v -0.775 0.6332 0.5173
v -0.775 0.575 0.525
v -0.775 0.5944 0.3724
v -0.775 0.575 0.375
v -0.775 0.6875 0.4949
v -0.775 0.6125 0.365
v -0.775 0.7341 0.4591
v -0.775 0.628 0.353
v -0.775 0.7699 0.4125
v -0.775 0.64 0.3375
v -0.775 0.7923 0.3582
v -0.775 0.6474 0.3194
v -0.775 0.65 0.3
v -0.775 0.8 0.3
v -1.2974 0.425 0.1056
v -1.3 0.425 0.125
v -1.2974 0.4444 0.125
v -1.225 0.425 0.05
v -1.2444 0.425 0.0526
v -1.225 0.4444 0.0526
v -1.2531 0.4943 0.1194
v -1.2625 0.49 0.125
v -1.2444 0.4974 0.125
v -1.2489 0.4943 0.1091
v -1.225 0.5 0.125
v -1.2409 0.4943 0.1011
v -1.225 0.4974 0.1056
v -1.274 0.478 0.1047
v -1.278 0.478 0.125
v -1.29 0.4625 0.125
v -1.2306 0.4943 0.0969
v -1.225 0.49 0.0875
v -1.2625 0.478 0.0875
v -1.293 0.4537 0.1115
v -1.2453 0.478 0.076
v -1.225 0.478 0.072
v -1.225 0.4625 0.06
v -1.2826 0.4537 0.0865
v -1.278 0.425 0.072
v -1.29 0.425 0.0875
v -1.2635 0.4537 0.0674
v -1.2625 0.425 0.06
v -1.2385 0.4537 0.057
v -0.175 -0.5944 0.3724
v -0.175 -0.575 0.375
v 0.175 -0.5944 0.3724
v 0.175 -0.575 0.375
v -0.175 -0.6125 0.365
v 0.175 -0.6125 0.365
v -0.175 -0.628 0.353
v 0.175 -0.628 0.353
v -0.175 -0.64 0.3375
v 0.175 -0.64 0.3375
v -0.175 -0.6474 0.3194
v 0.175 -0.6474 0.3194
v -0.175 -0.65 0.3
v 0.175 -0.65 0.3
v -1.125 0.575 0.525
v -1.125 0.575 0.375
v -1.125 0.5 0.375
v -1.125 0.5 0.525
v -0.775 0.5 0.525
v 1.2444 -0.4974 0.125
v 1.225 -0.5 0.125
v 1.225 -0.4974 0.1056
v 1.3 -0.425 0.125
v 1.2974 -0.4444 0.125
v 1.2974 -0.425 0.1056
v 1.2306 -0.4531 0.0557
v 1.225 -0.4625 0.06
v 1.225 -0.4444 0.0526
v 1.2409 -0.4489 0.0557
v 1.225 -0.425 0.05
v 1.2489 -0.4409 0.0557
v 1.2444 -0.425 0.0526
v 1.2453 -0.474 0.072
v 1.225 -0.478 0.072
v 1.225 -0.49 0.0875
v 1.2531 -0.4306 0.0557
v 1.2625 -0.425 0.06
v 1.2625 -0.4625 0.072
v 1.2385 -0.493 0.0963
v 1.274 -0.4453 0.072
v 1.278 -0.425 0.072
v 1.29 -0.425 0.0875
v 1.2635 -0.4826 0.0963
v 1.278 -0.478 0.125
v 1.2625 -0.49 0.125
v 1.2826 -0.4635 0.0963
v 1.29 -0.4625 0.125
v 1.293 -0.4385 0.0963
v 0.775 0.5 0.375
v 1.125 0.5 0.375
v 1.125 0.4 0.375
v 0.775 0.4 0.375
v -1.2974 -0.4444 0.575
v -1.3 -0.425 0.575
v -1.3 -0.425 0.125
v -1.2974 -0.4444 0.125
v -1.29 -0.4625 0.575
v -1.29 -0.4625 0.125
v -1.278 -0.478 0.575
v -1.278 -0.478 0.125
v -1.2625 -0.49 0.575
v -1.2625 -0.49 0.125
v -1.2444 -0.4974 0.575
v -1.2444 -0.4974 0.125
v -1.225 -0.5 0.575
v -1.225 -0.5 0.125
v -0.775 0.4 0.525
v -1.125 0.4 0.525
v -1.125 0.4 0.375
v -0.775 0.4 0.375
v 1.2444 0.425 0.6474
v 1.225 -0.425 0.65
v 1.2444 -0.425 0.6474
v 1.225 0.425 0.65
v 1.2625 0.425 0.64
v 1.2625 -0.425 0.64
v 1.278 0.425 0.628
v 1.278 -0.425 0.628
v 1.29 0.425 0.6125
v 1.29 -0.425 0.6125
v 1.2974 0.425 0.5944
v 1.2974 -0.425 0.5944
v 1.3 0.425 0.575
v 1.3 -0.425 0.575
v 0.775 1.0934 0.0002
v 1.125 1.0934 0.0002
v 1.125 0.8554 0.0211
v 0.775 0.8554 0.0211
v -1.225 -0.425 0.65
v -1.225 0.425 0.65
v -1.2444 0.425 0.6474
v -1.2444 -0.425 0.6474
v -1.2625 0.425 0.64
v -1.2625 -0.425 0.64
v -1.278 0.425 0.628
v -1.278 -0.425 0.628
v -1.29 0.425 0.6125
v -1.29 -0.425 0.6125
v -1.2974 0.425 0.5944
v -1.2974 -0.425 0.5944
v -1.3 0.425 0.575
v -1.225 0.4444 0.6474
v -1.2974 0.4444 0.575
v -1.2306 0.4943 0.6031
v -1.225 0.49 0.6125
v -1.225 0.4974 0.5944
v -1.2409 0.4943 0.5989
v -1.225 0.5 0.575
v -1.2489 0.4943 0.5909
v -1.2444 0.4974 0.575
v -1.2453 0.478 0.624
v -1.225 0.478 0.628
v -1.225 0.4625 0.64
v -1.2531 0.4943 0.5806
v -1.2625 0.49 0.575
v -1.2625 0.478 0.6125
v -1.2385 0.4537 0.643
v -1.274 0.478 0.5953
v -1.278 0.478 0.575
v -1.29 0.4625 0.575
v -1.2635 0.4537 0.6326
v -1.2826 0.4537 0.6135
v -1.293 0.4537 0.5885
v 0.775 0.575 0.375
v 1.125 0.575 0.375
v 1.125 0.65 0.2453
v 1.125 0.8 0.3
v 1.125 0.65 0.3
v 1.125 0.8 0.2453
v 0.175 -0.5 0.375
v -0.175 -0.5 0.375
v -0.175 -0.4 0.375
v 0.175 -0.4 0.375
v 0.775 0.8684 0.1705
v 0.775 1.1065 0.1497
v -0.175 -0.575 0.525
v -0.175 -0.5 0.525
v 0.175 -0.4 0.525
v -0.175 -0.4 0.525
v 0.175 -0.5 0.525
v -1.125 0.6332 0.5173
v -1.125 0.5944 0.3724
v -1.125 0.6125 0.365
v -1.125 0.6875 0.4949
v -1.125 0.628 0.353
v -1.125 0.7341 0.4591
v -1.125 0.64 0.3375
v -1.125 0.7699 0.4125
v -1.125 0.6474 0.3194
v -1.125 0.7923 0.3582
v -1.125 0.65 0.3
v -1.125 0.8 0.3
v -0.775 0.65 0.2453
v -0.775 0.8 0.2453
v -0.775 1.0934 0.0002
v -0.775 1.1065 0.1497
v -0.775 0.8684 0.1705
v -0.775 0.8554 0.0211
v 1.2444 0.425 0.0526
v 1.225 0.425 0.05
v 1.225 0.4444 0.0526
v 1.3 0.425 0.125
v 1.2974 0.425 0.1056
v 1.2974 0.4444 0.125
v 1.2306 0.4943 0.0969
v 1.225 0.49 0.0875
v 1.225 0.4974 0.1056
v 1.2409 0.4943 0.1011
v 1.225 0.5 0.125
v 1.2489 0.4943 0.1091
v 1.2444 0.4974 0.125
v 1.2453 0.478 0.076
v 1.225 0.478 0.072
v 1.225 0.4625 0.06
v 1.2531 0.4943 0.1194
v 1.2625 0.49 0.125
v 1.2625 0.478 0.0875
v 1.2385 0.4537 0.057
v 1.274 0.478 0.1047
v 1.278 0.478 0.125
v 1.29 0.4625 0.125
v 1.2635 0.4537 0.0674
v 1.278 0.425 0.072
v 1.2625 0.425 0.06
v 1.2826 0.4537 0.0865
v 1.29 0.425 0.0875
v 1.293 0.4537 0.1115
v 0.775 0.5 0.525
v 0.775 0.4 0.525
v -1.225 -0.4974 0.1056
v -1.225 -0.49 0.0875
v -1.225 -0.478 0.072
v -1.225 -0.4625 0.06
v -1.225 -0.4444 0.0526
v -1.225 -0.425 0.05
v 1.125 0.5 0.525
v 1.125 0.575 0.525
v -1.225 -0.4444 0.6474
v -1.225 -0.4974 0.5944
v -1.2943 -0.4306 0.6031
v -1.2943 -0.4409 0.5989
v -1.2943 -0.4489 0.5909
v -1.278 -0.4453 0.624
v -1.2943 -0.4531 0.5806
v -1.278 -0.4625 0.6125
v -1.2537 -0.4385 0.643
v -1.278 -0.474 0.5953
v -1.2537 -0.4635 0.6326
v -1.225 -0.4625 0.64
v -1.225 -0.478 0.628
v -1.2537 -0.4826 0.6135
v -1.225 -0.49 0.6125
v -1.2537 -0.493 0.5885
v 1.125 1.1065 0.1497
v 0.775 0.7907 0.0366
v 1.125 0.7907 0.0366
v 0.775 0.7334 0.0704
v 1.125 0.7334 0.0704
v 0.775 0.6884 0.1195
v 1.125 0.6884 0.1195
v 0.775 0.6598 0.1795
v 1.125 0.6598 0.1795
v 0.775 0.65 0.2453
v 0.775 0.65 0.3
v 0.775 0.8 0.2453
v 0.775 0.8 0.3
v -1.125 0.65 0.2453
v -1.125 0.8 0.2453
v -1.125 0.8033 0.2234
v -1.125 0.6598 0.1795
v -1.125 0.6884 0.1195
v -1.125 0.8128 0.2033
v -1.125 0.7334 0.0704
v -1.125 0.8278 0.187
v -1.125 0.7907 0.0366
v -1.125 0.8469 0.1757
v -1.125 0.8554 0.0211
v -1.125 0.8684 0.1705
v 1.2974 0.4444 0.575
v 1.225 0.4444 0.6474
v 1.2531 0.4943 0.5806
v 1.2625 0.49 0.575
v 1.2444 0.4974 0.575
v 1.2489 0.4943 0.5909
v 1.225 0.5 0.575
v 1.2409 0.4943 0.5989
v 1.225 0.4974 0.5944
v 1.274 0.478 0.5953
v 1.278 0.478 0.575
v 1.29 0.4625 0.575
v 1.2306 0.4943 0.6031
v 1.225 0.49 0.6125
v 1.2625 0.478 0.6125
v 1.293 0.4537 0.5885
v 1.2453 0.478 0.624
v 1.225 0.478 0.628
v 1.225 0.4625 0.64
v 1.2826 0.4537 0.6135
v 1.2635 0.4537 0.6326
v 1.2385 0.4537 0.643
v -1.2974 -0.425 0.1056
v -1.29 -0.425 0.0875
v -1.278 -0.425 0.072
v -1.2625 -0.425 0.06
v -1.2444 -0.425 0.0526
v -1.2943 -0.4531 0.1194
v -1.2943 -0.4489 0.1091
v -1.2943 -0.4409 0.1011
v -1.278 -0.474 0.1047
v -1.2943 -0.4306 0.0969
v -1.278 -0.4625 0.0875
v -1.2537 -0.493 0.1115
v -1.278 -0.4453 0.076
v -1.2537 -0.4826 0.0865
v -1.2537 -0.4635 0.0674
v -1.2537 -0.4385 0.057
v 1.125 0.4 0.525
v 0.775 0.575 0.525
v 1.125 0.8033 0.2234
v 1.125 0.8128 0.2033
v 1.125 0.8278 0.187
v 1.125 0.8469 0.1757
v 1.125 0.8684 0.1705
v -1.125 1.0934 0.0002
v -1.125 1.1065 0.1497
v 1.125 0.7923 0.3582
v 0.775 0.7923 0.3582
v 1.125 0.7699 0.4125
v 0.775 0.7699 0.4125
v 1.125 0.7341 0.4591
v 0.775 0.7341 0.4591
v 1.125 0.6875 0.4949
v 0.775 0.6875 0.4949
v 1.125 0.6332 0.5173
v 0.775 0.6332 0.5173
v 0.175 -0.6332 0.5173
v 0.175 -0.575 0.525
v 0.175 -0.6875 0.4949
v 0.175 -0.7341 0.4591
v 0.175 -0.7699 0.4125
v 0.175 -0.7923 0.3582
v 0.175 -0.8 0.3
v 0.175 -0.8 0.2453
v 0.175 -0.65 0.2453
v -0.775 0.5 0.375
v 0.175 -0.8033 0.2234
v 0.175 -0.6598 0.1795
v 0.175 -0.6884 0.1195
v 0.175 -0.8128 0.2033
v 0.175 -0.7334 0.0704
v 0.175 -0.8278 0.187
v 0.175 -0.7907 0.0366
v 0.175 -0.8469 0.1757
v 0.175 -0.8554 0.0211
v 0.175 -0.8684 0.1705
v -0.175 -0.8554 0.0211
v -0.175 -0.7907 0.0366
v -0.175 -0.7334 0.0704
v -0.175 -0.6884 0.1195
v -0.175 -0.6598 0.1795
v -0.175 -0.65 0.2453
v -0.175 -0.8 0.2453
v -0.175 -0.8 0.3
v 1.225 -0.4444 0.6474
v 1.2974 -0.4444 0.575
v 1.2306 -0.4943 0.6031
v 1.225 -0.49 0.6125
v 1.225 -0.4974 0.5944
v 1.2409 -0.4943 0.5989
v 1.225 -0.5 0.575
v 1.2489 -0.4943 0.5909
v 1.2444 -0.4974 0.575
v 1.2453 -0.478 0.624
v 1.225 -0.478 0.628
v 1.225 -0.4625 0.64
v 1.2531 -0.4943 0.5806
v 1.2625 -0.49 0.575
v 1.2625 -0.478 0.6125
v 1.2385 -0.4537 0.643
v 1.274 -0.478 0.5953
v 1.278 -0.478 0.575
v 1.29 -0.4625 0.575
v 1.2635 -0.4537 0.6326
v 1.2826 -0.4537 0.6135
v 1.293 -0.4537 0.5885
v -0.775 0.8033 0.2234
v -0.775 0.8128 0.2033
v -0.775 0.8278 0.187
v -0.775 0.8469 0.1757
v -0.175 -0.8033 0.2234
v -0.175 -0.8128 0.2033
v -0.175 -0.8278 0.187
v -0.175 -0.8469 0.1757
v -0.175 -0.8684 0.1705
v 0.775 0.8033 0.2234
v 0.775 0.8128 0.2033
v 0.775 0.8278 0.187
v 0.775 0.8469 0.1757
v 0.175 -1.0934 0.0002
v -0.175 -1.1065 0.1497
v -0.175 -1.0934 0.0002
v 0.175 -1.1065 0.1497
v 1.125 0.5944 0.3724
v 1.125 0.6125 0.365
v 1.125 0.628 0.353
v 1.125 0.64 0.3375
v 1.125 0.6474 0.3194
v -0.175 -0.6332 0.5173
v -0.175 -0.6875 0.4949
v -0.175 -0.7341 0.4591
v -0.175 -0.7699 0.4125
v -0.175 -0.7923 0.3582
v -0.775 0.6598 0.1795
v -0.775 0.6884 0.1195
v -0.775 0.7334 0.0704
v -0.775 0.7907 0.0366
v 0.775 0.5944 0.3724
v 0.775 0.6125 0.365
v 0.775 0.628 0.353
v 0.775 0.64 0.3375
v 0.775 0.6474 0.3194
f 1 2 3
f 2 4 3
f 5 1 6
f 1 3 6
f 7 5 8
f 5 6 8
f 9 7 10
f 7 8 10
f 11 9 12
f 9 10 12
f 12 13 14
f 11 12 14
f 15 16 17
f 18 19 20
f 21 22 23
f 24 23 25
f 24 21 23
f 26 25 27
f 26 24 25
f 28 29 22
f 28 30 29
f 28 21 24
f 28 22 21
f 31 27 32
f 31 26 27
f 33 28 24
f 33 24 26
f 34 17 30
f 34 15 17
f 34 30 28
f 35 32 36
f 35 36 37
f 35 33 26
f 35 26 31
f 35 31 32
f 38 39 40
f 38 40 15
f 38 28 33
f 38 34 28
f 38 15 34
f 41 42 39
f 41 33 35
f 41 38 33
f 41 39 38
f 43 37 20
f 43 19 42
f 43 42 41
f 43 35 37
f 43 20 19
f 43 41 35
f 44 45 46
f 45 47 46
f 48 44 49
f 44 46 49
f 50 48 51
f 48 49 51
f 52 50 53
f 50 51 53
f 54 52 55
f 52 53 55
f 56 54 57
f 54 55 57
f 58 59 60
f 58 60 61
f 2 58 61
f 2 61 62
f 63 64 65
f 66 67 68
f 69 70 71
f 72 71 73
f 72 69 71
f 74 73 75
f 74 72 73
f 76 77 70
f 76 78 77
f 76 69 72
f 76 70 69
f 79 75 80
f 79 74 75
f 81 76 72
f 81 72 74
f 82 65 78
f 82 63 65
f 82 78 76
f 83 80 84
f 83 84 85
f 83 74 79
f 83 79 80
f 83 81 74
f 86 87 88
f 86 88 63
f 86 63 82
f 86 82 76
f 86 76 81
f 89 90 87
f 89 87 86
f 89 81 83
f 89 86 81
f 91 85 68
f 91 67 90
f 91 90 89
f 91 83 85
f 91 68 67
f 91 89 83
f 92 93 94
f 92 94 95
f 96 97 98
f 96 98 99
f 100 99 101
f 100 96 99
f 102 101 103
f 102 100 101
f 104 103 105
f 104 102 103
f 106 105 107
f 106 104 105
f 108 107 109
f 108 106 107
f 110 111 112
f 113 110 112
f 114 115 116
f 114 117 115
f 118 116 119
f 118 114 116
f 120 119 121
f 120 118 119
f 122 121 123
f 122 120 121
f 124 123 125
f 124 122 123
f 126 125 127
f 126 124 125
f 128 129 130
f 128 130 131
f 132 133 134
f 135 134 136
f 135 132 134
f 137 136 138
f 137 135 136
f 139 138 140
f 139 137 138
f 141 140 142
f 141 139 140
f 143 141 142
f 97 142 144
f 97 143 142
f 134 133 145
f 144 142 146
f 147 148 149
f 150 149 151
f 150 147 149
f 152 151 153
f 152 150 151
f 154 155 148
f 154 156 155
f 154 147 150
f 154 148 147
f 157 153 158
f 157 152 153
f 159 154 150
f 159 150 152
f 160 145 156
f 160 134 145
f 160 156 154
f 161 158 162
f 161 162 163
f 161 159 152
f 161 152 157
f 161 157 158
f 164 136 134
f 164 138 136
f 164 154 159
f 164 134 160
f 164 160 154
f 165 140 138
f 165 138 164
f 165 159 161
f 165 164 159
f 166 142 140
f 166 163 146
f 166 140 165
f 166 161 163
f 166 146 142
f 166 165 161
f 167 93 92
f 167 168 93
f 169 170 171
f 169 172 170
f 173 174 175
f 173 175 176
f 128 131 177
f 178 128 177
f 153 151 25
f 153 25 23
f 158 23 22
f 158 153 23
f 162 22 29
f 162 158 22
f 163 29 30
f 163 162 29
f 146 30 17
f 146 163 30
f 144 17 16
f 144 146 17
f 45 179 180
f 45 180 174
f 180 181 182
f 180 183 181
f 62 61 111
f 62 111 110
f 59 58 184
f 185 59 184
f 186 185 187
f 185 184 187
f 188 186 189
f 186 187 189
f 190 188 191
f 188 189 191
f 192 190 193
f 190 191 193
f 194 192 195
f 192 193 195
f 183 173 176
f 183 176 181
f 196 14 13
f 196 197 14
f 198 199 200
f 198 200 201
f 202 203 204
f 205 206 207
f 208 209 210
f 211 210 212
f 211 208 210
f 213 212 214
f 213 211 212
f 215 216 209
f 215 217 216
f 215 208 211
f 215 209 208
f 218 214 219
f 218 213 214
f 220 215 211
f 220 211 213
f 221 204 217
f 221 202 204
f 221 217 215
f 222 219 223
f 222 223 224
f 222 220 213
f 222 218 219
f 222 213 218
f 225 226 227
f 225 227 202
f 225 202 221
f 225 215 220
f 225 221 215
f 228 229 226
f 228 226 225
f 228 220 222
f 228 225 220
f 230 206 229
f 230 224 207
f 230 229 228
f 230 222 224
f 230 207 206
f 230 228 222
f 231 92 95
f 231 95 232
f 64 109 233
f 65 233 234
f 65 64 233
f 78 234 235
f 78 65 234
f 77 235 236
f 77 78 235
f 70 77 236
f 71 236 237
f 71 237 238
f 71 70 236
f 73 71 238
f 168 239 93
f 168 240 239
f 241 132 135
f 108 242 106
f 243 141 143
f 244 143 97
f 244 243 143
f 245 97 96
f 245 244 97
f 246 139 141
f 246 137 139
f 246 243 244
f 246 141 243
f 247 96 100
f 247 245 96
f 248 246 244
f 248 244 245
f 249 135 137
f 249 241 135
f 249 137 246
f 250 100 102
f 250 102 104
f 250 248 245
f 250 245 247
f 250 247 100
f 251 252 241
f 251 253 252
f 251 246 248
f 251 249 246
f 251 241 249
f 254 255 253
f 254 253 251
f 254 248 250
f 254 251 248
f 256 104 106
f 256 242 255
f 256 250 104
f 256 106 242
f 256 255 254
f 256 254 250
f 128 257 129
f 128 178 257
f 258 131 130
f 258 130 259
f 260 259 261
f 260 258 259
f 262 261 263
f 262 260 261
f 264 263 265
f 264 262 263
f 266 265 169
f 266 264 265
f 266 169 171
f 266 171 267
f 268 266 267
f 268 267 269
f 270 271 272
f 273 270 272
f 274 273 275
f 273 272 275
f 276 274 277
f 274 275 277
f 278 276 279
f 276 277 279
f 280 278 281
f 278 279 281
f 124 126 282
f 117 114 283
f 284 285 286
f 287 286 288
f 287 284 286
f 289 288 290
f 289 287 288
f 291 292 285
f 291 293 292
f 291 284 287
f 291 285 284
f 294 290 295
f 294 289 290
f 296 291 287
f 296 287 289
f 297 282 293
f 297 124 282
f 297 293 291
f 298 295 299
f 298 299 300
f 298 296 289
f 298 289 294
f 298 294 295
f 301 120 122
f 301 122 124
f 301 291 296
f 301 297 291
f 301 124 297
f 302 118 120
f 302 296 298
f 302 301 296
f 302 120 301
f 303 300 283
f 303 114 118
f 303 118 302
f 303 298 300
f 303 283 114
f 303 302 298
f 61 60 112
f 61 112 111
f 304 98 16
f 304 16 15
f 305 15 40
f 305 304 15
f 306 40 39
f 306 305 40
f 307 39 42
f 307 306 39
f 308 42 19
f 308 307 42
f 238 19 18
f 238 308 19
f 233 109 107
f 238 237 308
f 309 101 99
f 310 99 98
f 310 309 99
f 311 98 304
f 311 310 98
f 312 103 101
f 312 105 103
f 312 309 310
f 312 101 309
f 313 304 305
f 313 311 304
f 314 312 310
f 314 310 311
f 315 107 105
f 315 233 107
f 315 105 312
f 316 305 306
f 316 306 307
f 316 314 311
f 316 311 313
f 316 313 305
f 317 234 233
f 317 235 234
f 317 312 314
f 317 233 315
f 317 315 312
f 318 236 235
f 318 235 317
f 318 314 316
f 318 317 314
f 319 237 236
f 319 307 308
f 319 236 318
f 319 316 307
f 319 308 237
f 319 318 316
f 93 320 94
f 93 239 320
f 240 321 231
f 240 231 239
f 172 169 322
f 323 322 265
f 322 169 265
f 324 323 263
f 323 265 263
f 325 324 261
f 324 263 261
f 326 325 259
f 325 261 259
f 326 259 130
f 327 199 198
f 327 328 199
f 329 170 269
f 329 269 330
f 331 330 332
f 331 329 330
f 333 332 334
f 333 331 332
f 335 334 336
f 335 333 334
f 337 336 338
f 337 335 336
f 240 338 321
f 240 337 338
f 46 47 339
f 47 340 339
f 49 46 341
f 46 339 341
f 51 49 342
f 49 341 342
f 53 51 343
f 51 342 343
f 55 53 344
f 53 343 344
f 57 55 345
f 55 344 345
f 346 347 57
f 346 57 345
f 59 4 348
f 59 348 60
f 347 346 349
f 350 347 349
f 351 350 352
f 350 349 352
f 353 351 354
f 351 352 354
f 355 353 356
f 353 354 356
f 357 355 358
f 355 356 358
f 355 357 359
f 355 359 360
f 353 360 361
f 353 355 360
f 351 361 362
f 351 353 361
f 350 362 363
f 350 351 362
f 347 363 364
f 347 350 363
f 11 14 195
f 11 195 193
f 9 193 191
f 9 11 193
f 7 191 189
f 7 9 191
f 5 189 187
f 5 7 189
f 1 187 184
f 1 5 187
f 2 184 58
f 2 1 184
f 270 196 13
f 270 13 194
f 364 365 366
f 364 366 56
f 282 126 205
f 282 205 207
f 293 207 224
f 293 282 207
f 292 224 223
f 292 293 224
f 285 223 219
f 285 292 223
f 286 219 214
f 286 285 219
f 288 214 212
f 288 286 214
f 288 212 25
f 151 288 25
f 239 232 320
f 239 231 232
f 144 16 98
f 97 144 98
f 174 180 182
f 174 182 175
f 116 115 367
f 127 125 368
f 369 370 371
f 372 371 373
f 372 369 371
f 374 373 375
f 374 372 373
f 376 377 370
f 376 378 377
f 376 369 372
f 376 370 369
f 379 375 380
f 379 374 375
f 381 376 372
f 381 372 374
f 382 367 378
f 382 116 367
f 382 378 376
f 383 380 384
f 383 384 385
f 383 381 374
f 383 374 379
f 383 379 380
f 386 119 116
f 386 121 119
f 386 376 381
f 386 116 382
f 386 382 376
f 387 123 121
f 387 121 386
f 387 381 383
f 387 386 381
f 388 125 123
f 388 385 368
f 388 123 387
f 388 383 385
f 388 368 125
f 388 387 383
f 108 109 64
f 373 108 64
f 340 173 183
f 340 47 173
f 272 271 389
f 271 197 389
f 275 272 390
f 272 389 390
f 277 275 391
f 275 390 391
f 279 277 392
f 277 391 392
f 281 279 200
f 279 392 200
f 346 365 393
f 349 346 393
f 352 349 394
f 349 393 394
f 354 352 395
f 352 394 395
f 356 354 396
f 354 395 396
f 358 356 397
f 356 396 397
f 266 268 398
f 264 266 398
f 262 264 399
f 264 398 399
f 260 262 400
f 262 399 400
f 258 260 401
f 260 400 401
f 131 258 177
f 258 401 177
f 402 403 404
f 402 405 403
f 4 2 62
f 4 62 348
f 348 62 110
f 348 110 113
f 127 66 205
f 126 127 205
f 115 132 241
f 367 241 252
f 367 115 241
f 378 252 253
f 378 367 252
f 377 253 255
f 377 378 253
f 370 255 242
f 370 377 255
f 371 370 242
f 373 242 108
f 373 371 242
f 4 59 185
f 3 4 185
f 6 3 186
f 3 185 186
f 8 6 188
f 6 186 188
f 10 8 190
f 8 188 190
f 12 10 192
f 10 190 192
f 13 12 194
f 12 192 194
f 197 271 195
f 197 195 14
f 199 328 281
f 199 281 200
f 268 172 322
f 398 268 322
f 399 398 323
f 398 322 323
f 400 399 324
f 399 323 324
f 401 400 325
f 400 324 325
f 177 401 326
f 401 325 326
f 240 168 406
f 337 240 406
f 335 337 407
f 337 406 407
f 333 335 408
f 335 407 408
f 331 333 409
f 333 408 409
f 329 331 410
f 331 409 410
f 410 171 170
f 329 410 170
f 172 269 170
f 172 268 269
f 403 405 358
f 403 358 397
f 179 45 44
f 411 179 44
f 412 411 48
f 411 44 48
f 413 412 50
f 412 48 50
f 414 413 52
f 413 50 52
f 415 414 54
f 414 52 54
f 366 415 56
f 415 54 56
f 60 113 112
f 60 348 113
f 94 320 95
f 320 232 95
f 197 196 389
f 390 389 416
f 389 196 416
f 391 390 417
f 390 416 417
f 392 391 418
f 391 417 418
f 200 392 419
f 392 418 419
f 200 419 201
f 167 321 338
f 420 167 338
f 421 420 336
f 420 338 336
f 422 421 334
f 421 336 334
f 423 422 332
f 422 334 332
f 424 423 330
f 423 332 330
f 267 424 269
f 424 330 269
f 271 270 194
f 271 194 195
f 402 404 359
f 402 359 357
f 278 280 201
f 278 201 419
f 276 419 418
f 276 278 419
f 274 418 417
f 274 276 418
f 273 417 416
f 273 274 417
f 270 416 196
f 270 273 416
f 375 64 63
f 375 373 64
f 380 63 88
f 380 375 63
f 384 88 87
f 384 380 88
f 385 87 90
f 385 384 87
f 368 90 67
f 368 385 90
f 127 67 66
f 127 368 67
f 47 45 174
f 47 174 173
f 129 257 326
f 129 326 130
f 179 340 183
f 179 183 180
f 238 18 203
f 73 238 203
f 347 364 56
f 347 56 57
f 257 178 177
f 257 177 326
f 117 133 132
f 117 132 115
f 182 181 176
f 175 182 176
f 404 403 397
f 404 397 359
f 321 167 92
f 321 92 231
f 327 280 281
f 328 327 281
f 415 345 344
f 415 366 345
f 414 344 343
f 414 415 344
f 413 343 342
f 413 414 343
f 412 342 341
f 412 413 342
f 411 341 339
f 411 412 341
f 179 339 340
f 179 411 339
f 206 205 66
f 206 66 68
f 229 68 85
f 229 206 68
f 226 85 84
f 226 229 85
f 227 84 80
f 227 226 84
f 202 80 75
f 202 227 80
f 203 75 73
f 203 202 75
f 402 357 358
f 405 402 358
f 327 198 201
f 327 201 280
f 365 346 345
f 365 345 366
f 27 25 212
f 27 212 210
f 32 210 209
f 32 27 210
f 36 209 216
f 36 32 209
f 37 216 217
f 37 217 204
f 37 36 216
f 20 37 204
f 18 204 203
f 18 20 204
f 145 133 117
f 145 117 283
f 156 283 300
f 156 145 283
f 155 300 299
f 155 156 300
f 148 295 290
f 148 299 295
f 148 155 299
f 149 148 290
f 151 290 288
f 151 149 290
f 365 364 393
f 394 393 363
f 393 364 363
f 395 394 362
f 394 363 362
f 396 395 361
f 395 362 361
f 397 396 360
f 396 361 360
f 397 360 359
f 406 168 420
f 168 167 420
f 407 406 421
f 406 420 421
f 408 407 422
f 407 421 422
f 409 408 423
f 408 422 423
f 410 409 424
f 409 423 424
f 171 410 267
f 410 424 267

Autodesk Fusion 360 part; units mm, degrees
ref_plane "WorkPlane1" through (0, 0, 0.05) normal (0, 0, 1) x (1, 0, 0)
sketch "Sketch1" plane through (0, 0, 0.05) normal (0, 0, 1) x (1, 0, 0)
  line L0 (1.3, 0.5) -> (-1.3, 0.5)
  line L1 (-1.3, 0.5) -> (-1.3, -0.5)
  line L2 (-1.3, -0.5) -> (1.3, -0.5)
  line L3 (1.3, -0.5) -> (1.3, 0.5)
  line L4 (1.3, 0.5) -> (-1.3, -0.5) construction
  line L5 (-1.3, 0.5) -> (1.3, -0.5) construction
  dimension "d2" = 2.6
  dimension "d3" = 1
extrude "Extrude1" add sketch "Sketch1" along normal blind 0.6 makes body 1
sketch "Sketch2" plane through (0, -0.5, 0) normal (0, -1, 0) x (1, 0, 0)
  line L0 (-1.3, 0.05) -> (1.3, 0.05)
  line L1 (1.3, 0.05) -> (1.3, 0.65)
  line L2 (1.3, 0.65) -> (-1.3, 0.65)
  line L3 (-1.3, 0.65) -> (-1.3, 0.05)
  line L4 (0.175, 0.375) -> (-0.175, 0.375)
  line L5 (-0.175, 0.375) -> (-0.175, 0.525)
  line L6 (-0.175, 0.525) -> (0.175, 0.525)
  line L7 (0.175, 0.525) -> (0.175, 0.375)
  line L8 (0.175, 0.375) -> (-0.175, 0.525) construction
  line L9 (-0.175, 0.375) -> (0.175, 0.525) construction
  point P0 (0, 0.45)
  dimension "d6" = 0.35
  dimension "d7" = 0.15
  dimension "d8" = 0.4
sketch "Sketch3" plane through (0, 0, 0) normal (1, 0, 0) x (0, 1, 0)
  line L0 (-0.5, 0.45) -> (-0.575, 0.45)
  arc A0 (-0.575, 0.45) -> (-0.725, 0.3) centre (-0.575, 0.3) ccw
  line L1 (-0.725, 0.3) -> (-0.725, 0.2453)
  arc A1 (-0.8619, 0.0958) -> (-0.725, 0.2453) centre (-0.875, 0.2453) ccw
  line L2 (-0.8619, 0.0958) -> (-1.1, 0.075)
  line L3 (-0.5, 0.525) -> (-0.5, 0.375)
  line L4 (-0.5, 0.45) -> (-0.4, 0.45)
  line L5 (-1.1, 0.075) -> (-0.6, 0.075) construction
  point P0 (-0.5, 0.45)
  dimension "d10" = 0.15
  dimension "d11" = 0.075
  dimension "d21" = 0.1
  dimension "d22" = 0.225
  dimension "d23" = 0.6
  dimension "d24" = 0.5
  dimension "d25" = 5
  dimension "d26" = 0.15
sweep "Sweep1" add profiles "Sketch2" path "Sketch3" along L2 A1 L1 A0 L0 L4 section 1 contours L4 L5 L6 L7 separate body makes body 2
pattern_linear "R-Pattern1" count 3 spacing 0.95 along (1, 0, 0) both ways of "Sweep1" makes body 3 makes body 4
fillet "Fillet1" radius 0.075 12 edges at (1.3, 0, 0.65) (0, -0.5, 0.65) (-1.3, 0, 0.65) (0, 0.5, 0.65) (1.3, -0.5, 0.35) (1.3, 0, 0.05) (1.3, 0.5, 0.35) (0, -0.5, 0.05) (-1.3, -0.5, 0.35) (-1.3, 0, 0.05) (0, 0.5, 0.05) (-1.3, 0.5, 0.35) on bodies 1
move_body "Move1" bodies 3 4 to x (-1, 0, 0) y (0, -1, 0) z (0, 0, 1) at (0, 0, 0)
equation "d1 = sop3_2_above_board"
equation "d2 = sop3_2_package_width"
equation "d3 = sop3_2_package_depth"
equation "d4 = sop3_2_package_height"
equation "d6 = sop3_2_lead_width"
equation "d7 = sop3_2_lead_thickness"
equation "d8 = sop3_2_lead_attach"
equation "d10 = sop3_2_lead_thickness"
equation "d11 = sop3_2_lead_thickness / 2"
equation "sop3_2_lead_thickness = 0.15 mm"
equation "sop3_2_lead_attach = 0.4 mm"
equation "sop3_2_lead_width = 0.35 mm"
equation "sop3_2_lead_spacing = 0.95 mm"
equation "sop3_2_package_width = 2.6 mm"
equation "sop3_2_package_height = 0.6 mm"
equation "sop3_2_package_depth = 1 mm"
equation "sop3_2_above_board = 0.05 mm"
equation "d21 = sop3_2_lead_into_package"
equation "d22 = sop3_2_lead_thickness * ( 3 / 2 )"
equation "d23 = sop3_2_lead_extension"
equation "d25 = sop3_2_lead_foot_angle"
equation "d26 = d10"
equation "sop3_2_lead_extension = 0.6 mm"
equation "sop3_2_lead_foot_angle = 5 deg"
equation "sop3_2_lead_into_package = 0.1 mm"
equation "d34 = sop3_2_lead_spacing"
equation "sop3_2_optional_lead_extension = 0 mm"
